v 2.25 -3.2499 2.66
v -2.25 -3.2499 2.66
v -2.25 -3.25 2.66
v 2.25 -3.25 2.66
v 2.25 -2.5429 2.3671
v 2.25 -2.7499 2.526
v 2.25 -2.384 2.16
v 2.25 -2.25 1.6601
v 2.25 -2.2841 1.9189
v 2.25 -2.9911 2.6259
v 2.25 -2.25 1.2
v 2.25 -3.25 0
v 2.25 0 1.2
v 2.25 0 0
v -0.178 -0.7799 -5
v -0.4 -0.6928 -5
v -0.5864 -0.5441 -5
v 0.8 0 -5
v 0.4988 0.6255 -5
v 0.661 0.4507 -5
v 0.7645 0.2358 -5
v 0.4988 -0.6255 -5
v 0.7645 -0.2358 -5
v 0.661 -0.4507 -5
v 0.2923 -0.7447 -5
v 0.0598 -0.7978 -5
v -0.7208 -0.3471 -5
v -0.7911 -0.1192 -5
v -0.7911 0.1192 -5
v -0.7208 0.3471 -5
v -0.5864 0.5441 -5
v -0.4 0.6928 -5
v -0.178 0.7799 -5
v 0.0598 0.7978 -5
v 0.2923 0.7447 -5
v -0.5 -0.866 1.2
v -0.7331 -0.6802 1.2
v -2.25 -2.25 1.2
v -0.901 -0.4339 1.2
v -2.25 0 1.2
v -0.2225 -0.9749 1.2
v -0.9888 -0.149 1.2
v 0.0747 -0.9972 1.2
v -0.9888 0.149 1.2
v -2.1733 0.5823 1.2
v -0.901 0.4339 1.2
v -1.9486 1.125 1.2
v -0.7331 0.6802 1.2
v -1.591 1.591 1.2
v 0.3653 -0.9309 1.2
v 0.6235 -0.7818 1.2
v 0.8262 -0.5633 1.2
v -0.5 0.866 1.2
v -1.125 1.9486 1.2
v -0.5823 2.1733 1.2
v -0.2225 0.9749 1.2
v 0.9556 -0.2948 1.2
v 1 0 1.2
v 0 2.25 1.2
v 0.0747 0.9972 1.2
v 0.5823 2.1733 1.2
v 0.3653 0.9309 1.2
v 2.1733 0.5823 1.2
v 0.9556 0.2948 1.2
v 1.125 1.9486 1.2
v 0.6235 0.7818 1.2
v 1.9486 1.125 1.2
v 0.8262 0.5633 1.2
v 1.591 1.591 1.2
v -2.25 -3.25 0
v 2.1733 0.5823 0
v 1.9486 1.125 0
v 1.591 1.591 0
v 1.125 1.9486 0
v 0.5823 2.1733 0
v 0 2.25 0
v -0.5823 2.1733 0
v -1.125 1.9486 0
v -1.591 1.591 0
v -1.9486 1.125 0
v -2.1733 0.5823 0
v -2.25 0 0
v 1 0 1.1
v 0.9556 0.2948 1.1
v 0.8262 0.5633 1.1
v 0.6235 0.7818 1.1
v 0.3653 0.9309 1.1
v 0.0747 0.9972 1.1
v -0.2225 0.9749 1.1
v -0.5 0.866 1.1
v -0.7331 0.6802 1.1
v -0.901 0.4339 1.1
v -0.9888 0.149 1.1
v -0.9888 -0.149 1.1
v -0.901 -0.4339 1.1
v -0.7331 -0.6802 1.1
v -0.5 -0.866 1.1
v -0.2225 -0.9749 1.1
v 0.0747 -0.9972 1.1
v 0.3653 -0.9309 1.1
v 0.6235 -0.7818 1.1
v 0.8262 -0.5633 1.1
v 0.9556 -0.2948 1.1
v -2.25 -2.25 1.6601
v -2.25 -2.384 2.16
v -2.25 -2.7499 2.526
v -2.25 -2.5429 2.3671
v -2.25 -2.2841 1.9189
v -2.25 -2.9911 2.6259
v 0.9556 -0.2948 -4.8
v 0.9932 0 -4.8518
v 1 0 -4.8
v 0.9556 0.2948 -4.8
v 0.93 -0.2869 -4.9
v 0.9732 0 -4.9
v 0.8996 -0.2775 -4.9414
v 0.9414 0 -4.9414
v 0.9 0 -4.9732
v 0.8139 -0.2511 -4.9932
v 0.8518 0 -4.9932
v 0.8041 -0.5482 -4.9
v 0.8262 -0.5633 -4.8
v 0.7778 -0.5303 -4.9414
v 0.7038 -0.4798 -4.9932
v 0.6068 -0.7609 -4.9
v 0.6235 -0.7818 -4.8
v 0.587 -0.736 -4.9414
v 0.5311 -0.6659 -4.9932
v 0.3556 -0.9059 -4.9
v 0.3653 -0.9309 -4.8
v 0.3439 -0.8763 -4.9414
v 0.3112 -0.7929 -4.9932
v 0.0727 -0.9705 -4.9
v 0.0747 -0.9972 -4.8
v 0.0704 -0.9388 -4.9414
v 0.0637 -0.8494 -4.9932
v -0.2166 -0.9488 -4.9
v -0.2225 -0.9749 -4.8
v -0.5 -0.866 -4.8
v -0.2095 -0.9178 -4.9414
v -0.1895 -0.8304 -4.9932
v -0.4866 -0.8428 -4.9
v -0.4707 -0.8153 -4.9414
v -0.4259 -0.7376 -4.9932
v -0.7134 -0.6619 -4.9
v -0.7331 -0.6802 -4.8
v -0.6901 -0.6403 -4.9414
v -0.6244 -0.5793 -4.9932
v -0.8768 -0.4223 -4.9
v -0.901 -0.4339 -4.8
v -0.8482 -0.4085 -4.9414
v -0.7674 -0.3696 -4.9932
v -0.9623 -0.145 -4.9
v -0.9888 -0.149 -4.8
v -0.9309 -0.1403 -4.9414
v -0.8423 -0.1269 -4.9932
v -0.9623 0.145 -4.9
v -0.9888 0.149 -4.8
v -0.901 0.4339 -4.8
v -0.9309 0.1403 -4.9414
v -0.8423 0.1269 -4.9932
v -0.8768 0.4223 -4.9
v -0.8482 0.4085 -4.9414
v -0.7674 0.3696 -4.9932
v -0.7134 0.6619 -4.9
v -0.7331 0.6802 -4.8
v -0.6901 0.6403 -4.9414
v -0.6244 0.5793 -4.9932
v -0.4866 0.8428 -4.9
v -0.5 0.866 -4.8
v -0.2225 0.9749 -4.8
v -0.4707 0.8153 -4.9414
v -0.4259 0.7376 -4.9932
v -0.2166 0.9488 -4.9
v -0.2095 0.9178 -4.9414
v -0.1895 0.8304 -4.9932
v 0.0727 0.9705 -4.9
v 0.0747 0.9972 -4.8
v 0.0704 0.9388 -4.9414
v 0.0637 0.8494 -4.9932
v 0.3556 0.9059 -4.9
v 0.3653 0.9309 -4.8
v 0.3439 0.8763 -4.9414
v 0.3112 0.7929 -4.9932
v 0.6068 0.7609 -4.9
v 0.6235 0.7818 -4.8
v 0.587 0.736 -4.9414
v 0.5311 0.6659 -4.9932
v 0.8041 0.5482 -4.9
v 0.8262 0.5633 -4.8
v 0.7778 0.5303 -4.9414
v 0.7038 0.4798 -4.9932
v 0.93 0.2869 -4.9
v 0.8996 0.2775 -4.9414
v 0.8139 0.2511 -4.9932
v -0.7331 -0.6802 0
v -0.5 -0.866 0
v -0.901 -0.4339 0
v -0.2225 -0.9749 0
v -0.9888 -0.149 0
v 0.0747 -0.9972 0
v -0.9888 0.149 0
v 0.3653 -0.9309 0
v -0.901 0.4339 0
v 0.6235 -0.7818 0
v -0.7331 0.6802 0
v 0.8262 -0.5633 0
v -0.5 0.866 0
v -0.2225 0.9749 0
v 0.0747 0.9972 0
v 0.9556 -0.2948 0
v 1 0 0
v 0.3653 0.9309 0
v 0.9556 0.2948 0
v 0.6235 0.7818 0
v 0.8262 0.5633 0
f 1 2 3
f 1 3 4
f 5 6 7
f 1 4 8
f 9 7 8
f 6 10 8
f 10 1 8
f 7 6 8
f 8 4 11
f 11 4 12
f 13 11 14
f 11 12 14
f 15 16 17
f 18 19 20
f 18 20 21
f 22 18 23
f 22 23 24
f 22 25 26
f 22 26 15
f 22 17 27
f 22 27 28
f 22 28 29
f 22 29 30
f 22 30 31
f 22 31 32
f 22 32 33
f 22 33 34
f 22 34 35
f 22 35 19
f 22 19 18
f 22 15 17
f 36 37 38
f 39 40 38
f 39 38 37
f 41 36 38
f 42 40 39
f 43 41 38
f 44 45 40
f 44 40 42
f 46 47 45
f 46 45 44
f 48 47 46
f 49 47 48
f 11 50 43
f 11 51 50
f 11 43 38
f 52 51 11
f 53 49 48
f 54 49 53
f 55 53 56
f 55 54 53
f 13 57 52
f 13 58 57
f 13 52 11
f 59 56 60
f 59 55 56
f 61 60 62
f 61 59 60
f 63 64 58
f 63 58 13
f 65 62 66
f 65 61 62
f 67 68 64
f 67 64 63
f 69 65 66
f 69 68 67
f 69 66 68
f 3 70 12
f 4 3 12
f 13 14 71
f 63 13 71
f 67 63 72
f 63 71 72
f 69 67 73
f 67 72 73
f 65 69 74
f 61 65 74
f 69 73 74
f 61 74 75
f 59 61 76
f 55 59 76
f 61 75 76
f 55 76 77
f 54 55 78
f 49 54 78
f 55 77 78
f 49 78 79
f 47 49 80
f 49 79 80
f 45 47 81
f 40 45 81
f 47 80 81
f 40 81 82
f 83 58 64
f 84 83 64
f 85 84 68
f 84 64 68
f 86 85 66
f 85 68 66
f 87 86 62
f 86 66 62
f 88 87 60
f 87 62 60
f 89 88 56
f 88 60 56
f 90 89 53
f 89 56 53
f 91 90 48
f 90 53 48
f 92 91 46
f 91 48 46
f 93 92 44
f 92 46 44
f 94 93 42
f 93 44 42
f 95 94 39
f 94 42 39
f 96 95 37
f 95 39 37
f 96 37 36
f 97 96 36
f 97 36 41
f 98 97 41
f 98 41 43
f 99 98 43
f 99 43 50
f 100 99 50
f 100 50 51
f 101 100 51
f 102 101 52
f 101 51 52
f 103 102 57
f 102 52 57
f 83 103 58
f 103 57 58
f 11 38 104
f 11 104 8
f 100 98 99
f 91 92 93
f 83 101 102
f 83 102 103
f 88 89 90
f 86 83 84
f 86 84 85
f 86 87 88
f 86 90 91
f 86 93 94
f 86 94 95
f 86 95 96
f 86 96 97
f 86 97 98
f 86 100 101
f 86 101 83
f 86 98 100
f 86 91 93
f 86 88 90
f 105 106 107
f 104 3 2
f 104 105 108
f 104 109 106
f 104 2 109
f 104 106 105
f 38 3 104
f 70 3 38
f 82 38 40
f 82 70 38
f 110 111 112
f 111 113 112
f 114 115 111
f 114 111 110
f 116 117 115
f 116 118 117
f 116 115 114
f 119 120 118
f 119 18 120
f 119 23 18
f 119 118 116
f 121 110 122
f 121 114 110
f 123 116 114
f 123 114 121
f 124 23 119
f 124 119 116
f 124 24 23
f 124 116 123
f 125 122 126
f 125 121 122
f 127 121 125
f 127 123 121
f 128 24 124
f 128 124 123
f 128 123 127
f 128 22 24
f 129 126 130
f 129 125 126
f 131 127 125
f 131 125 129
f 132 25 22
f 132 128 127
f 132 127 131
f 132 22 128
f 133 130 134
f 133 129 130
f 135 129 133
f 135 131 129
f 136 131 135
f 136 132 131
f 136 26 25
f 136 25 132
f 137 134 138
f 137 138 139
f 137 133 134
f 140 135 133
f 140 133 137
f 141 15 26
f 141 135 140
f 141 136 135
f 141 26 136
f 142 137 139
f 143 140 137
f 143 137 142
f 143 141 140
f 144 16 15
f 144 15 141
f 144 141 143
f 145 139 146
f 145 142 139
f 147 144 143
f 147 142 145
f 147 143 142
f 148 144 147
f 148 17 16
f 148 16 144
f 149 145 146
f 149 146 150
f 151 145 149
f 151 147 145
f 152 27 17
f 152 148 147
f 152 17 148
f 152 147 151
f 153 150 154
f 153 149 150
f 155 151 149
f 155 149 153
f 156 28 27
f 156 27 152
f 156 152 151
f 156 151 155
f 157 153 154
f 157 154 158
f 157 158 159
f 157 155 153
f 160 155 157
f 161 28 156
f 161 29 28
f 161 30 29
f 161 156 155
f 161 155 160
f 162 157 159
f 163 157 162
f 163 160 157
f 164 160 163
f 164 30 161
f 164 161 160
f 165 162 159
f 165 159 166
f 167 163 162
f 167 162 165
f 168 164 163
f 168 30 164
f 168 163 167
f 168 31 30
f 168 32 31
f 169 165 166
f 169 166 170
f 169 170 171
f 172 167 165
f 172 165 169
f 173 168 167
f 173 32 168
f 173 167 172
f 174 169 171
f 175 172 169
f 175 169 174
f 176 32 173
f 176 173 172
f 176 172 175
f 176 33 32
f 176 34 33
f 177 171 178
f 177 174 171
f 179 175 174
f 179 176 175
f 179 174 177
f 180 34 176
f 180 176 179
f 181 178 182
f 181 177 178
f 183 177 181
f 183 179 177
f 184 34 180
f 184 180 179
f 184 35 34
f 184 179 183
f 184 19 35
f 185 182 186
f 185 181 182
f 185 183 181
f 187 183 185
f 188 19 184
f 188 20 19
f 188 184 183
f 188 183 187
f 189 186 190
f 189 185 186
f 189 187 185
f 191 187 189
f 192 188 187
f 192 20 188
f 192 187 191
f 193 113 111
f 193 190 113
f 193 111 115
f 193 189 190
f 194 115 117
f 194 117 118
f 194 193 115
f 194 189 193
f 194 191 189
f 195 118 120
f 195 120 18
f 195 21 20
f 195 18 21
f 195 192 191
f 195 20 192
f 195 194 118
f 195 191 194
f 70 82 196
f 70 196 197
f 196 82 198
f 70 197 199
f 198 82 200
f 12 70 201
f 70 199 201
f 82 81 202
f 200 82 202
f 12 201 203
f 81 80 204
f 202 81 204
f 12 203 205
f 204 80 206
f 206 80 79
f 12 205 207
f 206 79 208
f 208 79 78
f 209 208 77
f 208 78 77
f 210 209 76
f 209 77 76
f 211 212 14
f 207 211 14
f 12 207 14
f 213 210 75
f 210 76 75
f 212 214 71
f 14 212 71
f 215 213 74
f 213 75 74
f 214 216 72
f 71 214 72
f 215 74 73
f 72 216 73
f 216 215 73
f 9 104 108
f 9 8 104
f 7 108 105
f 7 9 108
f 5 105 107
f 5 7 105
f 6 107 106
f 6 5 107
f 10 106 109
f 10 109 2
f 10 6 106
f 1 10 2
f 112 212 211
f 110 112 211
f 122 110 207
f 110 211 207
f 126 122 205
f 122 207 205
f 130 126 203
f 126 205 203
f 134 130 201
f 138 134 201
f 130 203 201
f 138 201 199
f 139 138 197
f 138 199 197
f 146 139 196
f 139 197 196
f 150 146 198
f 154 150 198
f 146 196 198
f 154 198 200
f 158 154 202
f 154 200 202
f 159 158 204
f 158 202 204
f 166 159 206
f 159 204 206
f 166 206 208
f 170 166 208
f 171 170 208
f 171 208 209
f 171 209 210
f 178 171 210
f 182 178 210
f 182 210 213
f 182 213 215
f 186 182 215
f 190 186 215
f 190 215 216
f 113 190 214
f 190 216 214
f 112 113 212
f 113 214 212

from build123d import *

# Parameters (mm, degrees)
BOSS_EXTRUDE1_DEPTH = 1.2
SKETCH2_W           = 4.5
SKETCH2_H           = 1
BOSS_EXTRUDE2_DEPTH = 2.66
FILLET1_R           = 1
SKETCH3_R           = 1
CUT_EXTRUDE1_DEPTH  = 0.1
SKETCH4_R           = 1
BOSS_EXTRUDE3_DEPTH = 5
FILLET2_R           = 0.2


with BuildPart() as part:
    # Sketch1 → Boss-Extrude1 (new body)
    with BuildSketch(Plane.XY):
        with BuildLine():
            Line((-2.25, 0), (-2.25, -2.25))
            Line((-2.25, -2.25), (2.25, -2.25))
            Line((2.25, -2.25), (2.25, 0))
            ThreePointArc((2.25, 0), (0, 2.25), (-2.25, 0))
        make_face()
    extrude(amount=BOSS_EXTRUDE1_DEPTH)

    # Sketch2 → Boss-Extrude2 (add)
    with BuildSketch(Plane.XY):
        with Locations((0, -2.75)):
            Rectangle(SKETCH2_W, SKETCH2_H)
    extrude(amount=BOSS_EXTRUDE2_DEPTH)

    # Fillet1
    fillet1_edges = [part.edges().sort_by_distance(p)[0] for p in [
        (0, -2.25, 2.66),
    ]]
    fillet(fillet1_edges, radius=FILLET1_R - 0.0001)  # a hair under: the kernel refuses the full size

    # Sketch3 → Cut-Extrude1 (cut)
    with BuildSketch(Plane.XY.offset(1.2)):
        Circle(SKETCH3_R)
    extrude(amount=-CUT_EXTRUDE1_DEPTH, mode=Mode.SUBTRACT)

    # Sketch4 → Boss-Extrude3 (add)
    with BuildSketch(Plane(origin=(0, 0, 0), x_dir=(-1, 0, 0), z_dir=(0, 0, -1))):
        with Locations(Location((0, 0, 0), (0, 0, 180))):
            Circle(SKETCH4_R)
    extrude(amount=BOSS_EXTRUDE3_DEPTH)

    # Fillet2
    fillet2_edges = [part.edges().sort_by_distance(p)[0] for p in [
        (-1, 0, -5),
    ]]
    fillet(fillet2_edges, radius=FILLET2_R)


solid = part.part
